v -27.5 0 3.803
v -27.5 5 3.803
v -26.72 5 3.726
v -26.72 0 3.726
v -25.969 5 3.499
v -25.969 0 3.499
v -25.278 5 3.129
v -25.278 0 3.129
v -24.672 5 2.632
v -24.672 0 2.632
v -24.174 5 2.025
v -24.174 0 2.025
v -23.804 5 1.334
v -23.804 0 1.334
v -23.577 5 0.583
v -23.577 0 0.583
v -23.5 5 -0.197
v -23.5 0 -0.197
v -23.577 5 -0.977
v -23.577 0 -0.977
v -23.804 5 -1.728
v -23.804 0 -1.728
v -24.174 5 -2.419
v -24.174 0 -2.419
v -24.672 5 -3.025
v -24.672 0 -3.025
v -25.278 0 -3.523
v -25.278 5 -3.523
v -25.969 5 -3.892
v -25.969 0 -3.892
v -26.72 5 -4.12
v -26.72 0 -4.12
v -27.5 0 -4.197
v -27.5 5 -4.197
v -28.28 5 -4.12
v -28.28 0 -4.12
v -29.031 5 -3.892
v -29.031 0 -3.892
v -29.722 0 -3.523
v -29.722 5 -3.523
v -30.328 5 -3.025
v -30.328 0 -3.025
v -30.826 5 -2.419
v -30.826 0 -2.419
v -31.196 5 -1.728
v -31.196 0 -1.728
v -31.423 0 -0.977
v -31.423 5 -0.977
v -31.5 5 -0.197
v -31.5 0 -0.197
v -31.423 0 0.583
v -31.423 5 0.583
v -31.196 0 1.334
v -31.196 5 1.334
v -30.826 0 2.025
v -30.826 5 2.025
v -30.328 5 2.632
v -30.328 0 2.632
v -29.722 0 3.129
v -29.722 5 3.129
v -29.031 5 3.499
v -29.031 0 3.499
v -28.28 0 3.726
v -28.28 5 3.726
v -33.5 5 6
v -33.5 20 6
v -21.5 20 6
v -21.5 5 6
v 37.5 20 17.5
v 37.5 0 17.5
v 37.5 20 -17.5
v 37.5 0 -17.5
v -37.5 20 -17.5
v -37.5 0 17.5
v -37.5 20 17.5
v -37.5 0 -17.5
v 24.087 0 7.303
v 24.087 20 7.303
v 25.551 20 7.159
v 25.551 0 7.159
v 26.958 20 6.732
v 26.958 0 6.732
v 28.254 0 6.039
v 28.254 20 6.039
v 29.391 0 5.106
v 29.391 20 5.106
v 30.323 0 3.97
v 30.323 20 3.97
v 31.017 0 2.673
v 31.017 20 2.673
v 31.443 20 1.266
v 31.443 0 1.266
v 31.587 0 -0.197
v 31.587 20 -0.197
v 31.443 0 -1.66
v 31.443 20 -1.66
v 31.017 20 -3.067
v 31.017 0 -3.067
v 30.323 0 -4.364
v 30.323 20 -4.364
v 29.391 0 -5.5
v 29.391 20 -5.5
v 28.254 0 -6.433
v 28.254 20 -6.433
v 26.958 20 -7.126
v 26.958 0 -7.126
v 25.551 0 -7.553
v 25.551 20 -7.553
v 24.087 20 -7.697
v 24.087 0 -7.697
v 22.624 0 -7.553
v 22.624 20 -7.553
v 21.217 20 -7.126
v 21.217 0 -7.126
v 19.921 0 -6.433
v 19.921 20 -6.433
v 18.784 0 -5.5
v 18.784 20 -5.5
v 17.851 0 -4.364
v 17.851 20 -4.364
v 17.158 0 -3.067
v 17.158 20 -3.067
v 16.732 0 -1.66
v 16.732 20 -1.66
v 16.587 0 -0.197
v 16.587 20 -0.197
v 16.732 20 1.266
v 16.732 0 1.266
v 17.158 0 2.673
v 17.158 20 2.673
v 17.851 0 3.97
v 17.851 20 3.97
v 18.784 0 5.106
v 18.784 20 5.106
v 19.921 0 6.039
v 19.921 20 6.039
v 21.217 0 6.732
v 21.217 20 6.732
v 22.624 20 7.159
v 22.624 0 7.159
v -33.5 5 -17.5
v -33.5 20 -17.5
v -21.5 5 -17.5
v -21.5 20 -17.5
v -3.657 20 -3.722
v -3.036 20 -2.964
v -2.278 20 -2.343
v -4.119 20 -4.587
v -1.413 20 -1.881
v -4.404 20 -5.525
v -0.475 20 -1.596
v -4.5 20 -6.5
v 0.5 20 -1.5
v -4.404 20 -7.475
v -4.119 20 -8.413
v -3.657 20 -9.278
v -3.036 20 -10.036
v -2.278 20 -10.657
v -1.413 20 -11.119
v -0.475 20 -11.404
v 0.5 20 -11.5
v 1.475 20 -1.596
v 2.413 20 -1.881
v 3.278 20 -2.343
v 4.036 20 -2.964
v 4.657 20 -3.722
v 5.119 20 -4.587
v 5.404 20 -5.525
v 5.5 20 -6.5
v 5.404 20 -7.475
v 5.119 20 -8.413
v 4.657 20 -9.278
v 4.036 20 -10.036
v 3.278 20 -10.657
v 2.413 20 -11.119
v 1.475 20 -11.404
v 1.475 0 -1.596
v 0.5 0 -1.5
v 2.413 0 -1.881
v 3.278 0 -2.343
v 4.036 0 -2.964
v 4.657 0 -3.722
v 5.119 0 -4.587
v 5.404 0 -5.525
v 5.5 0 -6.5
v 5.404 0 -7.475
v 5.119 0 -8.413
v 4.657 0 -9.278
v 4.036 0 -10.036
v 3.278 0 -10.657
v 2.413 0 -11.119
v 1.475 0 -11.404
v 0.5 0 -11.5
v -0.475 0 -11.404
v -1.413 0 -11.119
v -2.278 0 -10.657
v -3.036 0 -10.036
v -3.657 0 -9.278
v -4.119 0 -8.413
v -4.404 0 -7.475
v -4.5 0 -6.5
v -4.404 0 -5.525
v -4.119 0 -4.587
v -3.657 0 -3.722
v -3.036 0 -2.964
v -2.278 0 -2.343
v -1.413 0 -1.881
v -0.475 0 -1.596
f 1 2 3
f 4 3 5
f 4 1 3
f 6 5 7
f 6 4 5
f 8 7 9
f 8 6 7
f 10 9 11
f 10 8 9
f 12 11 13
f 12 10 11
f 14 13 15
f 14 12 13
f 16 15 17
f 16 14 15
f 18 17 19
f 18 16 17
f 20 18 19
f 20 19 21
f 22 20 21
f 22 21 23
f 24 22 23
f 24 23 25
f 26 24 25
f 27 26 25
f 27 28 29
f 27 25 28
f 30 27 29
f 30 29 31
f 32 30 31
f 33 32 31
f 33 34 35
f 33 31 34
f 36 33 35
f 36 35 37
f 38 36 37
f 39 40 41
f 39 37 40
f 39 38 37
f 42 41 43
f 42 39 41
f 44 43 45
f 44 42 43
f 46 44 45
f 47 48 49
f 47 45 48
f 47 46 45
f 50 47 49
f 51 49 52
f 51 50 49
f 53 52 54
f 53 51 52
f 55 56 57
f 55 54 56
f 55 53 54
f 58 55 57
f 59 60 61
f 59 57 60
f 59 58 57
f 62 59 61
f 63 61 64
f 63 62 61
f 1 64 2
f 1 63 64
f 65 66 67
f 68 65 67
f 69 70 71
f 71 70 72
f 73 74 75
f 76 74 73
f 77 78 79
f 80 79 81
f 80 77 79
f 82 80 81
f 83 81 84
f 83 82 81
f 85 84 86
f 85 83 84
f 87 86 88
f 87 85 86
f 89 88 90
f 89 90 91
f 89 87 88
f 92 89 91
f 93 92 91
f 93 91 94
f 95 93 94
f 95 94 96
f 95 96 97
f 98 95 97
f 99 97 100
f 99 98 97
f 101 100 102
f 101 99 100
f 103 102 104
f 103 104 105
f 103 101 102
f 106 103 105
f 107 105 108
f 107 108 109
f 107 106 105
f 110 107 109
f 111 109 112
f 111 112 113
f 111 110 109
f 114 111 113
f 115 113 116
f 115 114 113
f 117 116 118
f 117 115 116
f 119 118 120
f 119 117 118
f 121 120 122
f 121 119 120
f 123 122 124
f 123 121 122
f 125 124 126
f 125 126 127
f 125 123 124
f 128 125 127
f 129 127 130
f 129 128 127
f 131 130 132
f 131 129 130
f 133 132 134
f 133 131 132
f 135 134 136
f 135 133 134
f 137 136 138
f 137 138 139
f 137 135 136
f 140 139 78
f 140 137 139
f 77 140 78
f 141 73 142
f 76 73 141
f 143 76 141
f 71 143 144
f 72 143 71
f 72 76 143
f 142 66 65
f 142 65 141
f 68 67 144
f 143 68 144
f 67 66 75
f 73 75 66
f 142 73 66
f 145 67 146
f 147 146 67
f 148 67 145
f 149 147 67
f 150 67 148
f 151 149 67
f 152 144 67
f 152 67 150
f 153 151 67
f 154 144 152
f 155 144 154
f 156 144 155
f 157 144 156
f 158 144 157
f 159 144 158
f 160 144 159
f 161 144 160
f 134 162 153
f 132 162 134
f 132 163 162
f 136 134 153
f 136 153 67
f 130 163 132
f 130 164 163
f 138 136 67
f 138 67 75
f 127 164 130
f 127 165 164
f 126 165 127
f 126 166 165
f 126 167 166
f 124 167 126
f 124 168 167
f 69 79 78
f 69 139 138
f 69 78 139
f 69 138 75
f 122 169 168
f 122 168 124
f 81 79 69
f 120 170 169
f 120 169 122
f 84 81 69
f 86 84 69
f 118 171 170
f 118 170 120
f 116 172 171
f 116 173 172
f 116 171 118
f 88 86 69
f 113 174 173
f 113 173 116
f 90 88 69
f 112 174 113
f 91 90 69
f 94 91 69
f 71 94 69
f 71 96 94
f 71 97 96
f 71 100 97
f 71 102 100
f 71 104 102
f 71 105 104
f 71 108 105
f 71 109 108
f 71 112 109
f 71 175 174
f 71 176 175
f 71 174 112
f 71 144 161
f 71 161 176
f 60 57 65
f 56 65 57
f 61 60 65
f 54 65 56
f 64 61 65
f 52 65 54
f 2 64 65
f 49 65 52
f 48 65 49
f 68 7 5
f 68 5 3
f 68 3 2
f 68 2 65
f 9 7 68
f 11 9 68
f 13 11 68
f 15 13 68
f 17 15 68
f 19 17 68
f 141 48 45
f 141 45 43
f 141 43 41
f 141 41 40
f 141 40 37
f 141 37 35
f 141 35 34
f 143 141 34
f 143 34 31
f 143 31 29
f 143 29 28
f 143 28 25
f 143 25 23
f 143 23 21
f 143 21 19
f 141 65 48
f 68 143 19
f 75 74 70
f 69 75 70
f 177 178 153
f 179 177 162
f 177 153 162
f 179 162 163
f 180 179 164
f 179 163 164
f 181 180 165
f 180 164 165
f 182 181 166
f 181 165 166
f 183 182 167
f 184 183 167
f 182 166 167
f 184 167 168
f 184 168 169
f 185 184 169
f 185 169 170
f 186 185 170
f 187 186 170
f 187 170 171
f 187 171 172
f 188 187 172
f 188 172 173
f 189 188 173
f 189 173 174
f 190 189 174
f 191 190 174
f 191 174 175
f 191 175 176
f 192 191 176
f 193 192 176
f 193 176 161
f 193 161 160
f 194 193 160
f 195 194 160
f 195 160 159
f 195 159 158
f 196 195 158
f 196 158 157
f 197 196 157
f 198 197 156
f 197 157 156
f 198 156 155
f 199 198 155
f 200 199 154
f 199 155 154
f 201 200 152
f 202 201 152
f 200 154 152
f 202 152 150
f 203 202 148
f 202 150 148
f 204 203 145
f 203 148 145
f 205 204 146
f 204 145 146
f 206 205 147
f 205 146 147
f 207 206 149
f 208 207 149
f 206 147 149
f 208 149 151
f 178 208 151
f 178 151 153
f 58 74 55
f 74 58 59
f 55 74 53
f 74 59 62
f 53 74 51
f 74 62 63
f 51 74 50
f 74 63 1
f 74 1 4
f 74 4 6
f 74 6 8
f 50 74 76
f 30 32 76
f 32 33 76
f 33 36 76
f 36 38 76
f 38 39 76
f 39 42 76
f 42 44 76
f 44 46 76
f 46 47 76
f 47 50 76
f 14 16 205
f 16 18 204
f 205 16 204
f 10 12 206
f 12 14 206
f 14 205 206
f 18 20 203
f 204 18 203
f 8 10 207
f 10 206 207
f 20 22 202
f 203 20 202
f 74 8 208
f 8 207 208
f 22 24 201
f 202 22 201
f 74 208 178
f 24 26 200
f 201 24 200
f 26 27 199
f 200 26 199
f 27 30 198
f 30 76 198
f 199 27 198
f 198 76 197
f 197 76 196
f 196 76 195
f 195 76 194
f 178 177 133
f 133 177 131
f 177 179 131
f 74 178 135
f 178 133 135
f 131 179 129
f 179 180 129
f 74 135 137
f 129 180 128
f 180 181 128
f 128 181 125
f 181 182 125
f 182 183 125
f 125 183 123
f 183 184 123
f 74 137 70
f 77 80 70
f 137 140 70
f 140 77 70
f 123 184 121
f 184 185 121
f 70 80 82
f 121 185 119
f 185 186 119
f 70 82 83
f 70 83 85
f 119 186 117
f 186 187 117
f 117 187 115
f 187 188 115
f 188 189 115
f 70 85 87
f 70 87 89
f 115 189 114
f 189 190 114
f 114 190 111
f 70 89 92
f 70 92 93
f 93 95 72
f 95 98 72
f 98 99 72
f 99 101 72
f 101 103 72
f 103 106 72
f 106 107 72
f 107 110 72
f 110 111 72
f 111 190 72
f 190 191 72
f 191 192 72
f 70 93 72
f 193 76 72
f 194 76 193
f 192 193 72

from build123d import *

# Parameters (mm, degrees)
SKETCH1_W           = 75
SKETCH1_H           = 35
SKETCH1_R           = 7.5
SKETCH1_R_2         = 4
BOSS_EXTRUDE1_DEPTH = 20
SKETCH2_W           = 12
SKETCH2_H           = 23.5
CUT_EXTRUDE1_DEPTH  = 15
SKETCH3_R           = 5
CUT_EXTRUDE2_DEPTH  = 46.961940777


with BuildPart() as part:
    # Sketch1 → Boss-Extrude1 (new body)
    with BuildSketch(Plane(origin=(0, 0, 0), x_dir=(1, 0, 0), z_dir=(0, 1, 0))):
        Rectangle(SKETCH1_W, SKETCH1_H)
        with Locations(Location((24.087416082, 0.196874766, 0), (0, 0, 270))):
            Circle(SKETCH1_R, mode=Mode.SUBTRACT)
        with Locations(Location((-27.5, 0.196874766, 0), (0, 0, 270))):
            Circle(SKETCH1_R_2, mode=Mode.SUBTRACT)
    extrude(amount=BOSS_EXTRUDE1_DEPTH)

    # Sketch2 → Cut-Extrude1 (cut)
    with BuildSketch(Plane(origin=(0, 20, 0), x_dir=(1, 0, 0), z_dir=(0, 1, 0))):
        with Locations((-27.5, 5.75)):
            Rectangle(SKETCH2_W, SKETCH2_H)
    extrude(amount=-CUT_EXTRUDE1_DEPTH, mode=Mode.SUBTRACT)

    # Sketch3 → Cut-Extrude2 (cut, through all)
    with BuildSketch(Plane(origin=(0, 20, 0), x_dir=(1, 0, 0), z_dir=(0, 1, 0))):
        with Locations(Location((0.5, 6.5, 0), (0, 0, 270))):
            Circle(SKETCH3_R)
    extrude(amount=-CUT_EXTRUDE2_DEPTH, mode=Mode.SUBTRACT)


solid = part.part
